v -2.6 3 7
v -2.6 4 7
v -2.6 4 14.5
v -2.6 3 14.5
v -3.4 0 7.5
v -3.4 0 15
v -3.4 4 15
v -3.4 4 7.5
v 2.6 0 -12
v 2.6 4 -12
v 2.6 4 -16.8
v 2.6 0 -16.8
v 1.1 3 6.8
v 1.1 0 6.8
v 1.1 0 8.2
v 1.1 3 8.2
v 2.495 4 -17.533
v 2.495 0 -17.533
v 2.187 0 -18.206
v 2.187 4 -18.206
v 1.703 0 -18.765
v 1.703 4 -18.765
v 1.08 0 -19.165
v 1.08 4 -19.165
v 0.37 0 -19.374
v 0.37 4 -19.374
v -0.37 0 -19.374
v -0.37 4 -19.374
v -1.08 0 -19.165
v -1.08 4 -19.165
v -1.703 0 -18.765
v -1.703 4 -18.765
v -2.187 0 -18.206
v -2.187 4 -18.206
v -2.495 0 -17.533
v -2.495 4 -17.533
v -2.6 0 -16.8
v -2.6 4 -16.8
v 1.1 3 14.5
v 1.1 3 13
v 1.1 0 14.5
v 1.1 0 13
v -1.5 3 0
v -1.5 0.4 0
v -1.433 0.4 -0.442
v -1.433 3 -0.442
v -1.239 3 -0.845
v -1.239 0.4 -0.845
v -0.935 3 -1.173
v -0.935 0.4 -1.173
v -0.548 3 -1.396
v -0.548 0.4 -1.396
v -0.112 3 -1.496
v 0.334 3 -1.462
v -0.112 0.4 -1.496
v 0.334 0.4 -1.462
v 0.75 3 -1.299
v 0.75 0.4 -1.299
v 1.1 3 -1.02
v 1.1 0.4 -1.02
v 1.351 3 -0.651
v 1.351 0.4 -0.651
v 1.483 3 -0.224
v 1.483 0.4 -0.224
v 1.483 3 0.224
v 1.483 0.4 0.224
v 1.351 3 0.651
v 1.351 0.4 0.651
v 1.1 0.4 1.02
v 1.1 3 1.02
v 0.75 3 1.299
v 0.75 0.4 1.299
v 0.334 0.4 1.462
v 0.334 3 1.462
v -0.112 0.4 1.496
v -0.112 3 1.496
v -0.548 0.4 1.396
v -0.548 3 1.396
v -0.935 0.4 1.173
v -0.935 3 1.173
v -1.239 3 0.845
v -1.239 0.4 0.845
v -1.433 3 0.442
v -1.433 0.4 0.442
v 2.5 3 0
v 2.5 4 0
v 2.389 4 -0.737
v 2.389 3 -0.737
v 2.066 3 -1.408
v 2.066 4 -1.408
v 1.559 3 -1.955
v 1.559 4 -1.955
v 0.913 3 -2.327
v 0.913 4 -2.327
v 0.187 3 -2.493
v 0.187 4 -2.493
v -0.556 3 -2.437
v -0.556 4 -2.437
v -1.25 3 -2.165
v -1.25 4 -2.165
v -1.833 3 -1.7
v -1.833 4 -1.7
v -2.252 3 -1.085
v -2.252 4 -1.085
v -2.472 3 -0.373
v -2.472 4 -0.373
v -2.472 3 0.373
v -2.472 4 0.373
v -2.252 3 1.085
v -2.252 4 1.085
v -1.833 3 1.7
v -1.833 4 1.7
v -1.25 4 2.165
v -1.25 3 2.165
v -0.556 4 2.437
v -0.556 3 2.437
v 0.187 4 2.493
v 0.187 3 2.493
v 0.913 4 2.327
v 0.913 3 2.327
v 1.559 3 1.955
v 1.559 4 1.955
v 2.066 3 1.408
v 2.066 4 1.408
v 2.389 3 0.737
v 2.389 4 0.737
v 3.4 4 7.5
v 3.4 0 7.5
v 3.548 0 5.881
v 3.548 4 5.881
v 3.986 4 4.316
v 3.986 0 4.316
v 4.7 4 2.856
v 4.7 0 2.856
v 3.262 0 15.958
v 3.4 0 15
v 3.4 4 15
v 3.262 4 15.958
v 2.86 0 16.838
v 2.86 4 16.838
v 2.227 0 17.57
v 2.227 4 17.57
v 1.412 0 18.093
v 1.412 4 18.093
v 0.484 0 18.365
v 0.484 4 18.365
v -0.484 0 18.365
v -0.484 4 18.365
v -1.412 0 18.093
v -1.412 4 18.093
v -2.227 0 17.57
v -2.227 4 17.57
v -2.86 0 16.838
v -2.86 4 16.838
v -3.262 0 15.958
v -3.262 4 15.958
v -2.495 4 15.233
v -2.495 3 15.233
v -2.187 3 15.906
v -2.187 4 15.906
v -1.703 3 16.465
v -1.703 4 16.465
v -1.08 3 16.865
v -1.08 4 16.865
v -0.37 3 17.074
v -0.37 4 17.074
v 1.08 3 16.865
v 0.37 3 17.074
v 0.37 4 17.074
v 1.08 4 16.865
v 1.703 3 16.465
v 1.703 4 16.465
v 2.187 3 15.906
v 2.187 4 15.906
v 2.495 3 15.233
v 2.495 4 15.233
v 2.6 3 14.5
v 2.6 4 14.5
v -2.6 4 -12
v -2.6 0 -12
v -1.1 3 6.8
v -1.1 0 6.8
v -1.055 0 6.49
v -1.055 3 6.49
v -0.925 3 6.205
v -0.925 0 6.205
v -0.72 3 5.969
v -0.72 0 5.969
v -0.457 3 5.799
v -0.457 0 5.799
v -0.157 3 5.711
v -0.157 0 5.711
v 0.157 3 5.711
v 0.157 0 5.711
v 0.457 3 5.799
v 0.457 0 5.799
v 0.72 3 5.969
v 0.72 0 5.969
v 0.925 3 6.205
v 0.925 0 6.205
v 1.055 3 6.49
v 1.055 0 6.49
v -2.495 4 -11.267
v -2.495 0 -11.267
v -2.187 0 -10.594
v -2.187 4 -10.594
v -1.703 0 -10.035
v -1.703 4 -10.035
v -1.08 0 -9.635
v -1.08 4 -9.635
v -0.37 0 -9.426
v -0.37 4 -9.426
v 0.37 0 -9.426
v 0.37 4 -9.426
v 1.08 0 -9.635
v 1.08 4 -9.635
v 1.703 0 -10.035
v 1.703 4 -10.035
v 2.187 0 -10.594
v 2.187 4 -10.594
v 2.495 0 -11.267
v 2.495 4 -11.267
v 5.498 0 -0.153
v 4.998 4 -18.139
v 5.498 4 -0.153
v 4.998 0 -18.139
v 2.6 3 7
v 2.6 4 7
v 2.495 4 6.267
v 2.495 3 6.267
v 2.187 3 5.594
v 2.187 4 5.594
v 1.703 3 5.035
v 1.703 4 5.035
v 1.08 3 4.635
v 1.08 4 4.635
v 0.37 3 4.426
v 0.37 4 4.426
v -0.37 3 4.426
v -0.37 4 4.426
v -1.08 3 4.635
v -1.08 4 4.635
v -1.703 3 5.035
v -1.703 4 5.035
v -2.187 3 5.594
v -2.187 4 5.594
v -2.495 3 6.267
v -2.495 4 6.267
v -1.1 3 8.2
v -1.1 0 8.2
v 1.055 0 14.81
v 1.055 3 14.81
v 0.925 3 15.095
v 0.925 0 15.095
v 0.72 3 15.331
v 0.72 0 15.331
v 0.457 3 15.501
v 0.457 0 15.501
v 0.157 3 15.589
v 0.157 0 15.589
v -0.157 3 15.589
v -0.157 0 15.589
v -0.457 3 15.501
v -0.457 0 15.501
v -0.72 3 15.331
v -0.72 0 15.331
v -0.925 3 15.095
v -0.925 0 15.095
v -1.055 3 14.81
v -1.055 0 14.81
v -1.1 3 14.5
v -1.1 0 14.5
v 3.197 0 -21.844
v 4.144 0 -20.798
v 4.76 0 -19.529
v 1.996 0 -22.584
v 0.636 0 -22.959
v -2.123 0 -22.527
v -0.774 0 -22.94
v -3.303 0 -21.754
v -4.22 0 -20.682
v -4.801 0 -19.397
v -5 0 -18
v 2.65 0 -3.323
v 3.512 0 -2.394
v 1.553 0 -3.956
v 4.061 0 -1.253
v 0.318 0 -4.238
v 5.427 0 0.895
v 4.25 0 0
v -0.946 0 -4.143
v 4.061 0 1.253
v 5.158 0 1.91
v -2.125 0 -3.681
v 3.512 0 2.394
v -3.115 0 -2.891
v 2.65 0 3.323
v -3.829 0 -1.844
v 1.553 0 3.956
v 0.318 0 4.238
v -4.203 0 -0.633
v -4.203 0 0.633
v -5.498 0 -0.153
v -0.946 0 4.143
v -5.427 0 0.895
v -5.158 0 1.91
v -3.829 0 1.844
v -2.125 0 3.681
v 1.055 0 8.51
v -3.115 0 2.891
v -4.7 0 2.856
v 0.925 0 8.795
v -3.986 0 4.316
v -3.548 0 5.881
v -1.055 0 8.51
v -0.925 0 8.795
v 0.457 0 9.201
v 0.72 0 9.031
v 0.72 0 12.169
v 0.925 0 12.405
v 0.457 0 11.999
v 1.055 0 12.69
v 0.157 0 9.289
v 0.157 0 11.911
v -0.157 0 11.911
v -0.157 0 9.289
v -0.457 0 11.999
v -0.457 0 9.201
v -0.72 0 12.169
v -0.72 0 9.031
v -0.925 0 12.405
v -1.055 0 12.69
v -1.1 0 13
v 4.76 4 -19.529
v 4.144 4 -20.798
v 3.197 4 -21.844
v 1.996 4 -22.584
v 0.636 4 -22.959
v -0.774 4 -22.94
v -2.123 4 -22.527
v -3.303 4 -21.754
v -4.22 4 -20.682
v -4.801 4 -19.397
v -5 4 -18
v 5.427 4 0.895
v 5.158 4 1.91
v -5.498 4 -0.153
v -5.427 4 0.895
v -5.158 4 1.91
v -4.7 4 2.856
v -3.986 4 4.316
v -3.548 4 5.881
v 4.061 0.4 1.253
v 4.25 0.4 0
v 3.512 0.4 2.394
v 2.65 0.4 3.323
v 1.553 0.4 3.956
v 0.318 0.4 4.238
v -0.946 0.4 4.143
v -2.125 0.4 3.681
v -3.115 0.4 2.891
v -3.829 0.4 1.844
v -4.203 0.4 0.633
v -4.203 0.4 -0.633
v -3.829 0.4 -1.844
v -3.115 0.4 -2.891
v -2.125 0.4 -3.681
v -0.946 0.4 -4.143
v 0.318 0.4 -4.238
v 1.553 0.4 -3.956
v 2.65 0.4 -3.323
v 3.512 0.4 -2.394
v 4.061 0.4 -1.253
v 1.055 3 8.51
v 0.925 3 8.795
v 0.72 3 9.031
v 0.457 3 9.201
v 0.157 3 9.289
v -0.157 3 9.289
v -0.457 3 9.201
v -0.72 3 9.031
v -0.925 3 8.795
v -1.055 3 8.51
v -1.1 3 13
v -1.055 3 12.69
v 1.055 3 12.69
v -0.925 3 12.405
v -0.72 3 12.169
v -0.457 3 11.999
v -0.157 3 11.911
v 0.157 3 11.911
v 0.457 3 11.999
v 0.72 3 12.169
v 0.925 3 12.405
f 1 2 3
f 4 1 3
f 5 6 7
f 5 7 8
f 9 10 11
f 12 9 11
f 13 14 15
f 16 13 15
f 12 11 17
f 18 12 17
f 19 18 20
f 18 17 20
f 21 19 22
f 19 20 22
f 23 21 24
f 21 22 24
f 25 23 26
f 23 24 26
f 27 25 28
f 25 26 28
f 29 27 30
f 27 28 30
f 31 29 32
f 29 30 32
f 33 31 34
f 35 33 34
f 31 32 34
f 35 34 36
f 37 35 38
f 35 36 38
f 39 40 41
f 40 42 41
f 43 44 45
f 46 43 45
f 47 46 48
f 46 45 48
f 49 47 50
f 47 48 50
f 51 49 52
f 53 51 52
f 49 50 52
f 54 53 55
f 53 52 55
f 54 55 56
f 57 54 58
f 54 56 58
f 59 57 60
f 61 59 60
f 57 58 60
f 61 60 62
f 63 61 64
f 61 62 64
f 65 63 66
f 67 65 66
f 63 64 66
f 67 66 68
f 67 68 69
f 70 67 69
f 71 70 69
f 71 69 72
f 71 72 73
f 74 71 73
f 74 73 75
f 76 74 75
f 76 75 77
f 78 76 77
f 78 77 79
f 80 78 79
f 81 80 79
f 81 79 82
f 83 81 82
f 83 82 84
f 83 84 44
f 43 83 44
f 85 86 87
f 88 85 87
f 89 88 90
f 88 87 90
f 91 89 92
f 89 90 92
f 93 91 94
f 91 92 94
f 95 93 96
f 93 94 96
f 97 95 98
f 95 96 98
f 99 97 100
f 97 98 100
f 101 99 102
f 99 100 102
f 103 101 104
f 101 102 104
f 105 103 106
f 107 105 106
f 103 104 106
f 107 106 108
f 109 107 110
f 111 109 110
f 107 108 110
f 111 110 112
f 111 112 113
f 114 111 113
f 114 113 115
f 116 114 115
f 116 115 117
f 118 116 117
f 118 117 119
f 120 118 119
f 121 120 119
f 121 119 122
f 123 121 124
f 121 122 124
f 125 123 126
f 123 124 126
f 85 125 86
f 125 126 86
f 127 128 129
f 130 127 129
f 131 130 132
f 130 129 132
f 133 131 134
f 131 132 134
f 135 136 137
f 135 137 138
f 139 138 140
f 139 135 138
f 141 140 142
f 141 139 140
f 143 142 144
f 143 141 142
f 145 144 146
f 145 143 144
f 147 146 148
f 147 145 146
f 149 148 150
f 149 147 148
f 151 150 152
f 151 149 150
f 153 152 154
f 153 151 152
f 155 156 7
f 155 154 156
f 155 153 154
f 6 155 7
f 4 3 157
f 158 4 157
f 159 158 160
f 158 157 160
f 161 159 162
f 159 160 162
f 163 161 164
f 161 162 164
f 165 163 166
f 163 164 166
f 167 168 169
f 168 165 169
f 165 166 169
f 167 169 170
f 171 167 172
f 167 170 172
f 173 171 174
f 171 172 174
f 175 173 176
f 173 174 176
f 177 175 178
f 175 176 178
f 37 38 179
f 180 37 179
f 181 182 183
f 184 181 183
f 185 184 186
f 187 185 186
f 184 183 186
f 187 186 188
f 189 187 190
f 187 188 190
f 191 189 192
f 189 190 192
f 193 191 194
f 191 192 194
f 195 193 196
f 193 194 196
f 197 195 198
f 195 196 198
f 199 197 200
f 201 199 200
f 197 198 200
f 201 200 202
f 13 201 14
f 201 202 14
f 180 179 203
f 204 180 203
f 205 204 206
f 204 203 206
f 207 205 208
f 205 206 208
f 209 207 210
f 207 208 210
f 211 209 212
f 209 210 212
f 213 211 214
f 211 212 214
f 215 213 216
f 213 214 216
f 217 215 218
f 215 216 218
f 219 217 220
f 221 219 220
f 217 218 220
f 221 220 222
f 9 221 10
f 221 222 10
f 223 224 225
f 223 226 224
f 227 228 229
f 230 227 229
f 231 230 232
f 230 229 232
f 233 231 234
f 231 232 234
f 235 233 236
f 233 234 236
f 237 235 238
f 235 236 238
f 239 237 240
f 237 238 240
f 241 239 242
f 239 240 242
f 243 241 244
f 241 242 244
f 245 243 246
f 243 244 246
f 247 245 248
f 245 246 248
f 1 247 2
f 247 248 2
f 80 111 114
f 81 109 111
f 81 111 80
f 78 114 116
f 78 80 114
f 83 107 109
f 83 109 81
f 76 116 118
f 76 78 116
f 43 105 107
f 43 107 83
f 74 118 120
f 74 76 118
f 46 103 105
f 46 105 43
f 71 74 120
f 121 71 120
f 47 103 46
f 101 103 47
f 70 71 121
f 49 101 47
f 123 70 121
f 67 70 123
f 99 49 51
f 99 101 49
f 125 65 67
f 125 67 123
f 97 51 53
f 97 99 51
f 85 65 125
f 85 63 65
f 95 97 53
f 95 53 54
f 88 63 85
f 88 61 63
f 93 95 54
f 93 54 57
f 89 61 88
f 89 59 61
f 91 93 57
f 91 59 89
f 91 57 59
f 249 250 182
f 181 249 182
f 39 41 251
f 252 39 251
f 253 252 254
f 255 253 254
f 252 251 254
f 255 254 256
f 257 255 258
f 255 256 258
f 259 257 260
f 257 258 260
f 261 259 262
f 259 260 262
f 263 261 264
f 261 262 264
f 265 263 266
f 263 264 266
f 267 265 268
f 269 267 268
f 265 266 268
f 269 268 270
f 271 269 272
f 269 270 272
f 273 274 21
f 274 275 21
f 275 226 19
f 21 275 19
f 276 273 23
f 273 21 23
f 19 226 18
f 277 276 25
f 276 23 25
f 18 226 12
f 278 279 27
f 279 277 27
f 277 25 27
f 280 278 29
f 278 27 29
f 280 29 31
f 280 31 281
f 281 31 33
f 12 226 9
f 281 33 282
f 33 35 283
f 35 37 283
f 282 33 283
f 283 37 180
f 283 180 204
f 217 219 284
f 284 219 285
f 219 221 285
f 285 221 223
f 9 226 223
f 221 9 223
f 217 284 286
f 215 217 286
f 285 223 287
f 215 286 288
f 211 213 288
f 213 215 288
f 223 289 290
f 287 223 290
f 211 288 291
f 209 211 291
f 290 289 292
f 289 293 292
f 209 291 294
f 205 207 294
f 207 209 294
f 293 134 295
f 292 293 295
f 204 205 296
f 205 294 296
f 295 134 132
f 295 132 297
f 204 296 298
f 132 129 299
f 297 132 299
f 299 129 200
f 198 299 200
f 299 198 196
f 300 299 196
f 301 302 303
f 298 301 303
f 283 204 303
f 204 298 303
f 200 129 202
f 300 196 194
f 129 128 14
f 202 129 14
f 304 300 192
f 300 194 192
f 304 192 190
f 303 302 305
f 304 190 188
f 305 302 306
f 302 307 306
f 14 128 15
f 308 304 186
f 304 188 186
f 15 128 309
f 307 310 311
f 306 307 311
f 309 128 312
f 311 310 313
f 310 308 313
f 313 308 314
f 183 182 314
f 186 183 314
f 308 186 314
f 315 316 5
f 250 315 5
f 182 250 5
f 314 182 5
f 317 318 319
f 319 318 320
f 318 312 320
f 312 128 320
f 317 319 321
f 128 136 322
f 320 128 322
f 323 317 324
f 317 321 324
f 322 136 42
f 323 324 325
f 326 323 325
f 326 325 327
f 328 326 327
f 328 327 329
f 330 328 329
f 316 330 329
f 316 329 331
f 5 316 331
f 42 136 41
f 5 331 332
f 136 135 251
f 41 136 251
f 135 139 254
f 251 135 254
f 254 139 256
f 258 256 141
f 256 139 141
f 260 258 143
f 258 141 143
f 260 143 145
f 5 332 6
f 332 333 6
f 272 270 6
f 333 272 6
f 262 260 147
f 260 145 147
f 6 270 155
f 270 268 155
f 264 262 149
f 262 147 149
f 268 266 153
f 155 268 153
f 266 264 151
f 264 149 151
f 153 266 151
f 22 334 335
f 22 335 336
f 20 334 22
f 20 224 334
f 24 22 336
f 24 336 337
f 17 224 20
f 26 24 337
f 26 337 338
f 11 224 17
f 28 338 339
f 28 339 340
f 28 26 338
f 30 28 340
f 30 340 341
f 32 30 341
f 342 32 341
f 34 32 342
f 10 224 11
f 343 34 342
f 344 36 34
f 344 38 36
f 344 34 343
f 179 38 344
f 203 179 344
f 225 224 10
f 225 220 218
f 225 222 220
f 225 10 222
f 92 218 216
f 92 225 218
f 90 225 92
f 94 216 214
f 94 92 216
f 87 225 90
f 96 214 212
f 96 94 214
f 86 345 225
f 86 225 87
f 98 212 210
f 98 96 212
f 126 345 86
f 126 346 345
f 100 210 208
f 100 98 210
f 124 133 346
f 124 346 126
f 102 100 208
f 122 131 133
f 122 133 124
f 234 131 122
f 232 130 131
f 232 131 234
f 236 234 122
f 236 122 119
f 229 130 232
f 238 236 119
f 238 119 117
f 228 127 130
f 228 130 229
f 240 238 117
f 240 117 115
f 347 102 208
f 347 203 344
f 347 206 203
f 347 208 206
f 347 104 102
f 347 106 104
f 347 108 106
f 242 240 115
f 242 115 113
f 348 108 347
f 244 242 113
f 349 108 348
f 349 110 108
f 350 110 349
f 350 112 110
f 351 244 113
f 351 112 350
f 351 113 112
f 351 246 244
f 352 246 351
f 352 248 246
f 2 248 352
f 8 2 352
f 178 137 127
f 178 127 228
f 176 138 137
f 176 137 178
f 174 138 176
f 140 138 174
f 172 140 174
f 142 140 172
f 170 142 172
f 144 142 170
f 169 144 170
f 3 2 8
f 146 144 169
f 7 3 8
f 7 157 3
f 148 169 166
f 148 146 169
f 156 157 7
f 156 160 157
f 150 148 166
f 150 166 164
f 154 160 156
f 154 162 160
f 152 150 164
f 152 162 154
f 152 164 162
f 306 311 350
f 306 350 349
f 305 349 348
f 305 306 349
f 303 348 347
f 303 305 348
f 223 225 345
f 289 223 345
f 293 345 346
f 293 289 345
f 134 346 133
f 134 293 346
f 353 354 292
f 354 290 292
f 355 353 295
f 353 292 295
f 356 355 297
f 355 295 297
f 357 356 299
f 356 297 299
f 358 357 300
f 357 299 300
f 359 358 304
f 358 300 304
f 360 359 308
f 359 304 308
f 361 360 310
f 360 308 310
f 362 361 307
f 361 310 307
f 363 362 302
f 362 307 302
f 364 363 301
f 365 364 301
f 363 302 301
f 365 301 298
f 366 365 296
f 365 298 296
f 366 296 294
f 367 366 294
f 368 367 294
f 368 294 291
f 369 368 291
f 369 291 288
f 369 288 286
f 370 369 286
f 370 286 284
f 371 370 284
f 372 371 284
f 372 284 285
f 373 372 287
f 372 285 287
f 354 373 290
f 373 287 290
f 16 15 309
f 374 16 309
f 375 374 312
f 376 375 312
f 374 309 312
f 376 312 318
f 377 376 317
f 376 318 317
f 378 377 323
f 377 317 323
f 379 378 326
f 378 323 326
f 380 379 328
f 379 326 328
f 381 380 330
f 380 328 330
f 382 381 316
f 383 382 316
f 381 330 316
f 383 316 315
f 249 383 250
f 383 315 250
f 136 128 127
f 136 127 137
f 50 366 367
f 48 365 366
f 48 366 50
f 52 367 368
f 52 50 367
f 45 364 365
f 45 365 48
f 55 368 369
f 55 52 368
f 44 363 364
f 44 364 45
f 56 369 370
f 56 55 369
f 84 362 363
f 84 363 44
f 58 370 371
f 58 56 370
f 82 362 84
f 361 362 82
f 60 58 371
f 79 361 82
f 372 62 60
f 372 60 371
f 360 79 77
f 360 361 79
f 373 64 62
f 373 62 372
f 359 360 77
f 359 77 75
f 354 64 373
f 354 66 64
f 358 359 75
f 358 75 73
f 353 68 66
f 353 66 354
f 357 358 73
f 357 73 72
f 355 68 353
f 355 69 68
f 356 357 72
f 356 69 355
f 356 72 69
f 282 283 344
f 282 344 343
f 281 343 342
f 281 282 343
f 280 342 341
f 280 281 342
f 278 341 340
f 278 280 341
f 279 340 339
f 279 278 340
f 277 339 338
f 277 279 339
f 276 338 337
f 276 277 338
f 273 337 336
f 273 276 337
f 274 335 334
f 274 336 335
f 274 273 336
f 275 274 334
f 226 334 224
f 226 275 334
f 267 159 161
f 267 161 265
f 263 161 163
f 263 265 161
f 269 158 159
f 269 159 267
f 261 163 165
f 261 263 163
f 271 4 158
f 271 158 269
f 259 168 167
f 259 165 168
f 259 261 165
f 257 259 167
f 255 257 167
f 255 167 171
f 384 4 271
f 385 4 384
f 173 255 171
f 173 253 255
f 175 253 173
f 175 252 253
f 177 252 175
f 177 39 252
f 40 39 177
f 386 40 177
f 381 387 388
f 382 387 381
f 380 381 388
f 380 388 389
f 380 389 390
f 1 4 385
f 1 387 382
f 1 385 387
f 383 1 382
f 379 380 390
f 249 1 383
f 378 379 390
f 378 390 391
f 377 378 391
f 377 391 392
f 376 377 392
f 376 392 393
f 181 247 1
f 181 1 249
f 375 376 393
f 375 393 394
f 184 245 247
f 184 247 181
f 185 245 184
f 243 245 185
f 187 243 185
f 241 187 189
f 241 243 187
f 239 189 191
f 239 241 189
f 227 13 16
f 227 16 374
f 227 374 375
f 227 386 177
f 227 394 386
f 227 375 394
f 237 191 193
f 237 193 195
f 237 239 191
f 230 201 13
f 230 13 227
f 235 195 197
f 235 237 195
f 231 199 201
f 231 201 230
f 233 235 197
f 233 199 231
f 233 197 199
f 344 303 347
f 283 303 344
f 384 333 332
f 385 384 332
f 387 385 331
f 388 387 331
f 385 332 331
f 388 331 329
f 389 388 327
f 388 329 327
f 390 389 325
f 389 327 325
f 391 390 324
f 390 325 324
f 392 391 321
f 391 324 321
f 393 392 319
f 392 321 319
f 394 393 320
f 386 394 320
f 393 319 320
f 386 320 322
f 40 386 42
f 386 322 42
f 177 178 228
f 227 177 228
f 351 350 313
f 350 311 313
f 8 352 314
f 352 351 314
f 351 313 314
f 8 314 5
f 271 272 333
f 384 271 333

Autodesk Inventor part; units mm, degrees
ref_plane "YZ Plane" through (0, 0, 0) normal (1, 0, 0) x (0, 1, 0)
ref_plane "XZ Plane" through (0, 0, 0) normal (0, 1, 0) x (-1, 0, 0)
ref_plane "XY Plane" through (0, 0, 0) normal (0, 0, 1) x (1, 0, 0)
sketch "Sketch1" plane through (0, 0, 0) normal (0, 1, 0) x (-1, 0, 0)
  circle A0 centre (0, 0) radius 1.5
  circle A1 centre (0, 0) radius 5.5
  circle A2 centre (0, -18) radius 5
  line L0 (5.4979, -0.1528) -> (4.9981, -18.1389)
  line L1 (-4.9981, -18.1389) -> (-5.4979, -0.1528)
  line L2 (0, 0) -> (0, 15) construction
  line L3 (-3.4, 0) -> (-3.4, 15)
  line L4 (3.4, 15) -> (3.4, 0)
  arc A3 (-3.4, 0) -> (3.4, 0) centre (0, 0) ccw
  arc A4 (3.4, 15) -> (-3.4, 15) centre (0, 15) ccw
  arc A5 (3.4, 7.5) -> (4.7003, 2.8561) centre (12.3429, 7.5) ccw
  arc A6 (-4.7003, 2.8561) -> (-3.4, 7.5) centre (-12.3429, 7.5) ccw
  point P0 (0, 7.5)
  point P1 (-3.4, 4.3232)
  point P2 (3.4, 4.3232)
  point P3 (-3.4, 7.5)
  dimension "d0" = 3
  dimension "d1" = 11
  dimension "d3" = 18
  dimension "d43" = 15
  dimension "d44" = 3.4
  dimension "d74" = 10
extrude "Extrusion1" add sketch "Sketch1" along normal blind 4
sketch "Sketch2" plane through (0, 4, 0) normal (0, 1, 0) x (1, 0, 0)
  arc A0 (4.9981, 18.1389) -> (-4.9981, 18.1389) centre (0, 18) ccw projected
  circle A1 centre (0, 0) radius 1.5 projected
  line L0 (0, 16.8) -> (0, 12) construction
  line L1 (-2.6, 16.8) -> (-2.6, 12)
  line L2 (2.6, 12) -> (2.6, 16.8)
  arc A2 (2.6, 16.8) -> (-2.6, 16.8) centre (0, 16.8) ccw
  arc A3 (-2.6, 12) -> (2.6, 12) centre (0, 12) ccw
  line L3 (-3.4, -7.5) -> (-3.4, -15) projected
  arc A4 (-3.4, -15) -> (3.4, -15) centre (0, -15) ccw projected
  line L4 (3.4, -15) -> (3.4, -7.5) projected
  line L5 (-4.9981, 18.1389) -> (-5.4979, 0.1528) projected
  arc A5 (-5.4979, 0.1528) -> (-4.7003, -2.8561) centre (0, 0) ccw projected
  arc A6 (4.7003, -2.8561) -> (5.4979, 0.1528) centre (0, 0) ccw projected
  line L6 (5.4979, 0.1528) -> (4.9981, 18.1389) projected
  arc A7 (-3.4, -7.5) -> (-4.7003, -2.8561) centre (-12.3429, -7.5) ccw projected
  arc A8 (4.7003, -2.8561) -> (3.4, -7.5) centre (12.3429, -7.5) ccw projected
  point P0 (0, 14.4)
  dimension "d6" = 4.8
  dimension "d7" = 5.2
  dimension "d9" = 12
extrude "Extrusion2" cut sketch "Sketch2" against normal through all contours A2 L2 A3 L1
sketch "Sketch8" plane through (0, 4, 0) normal (0, 1, 0) x (1, 0, 0)
  line L0 (0, 31.28) -> (0, -26.68) projected
  line L1 (0, -14.5) -> (0, -7) construction
  line L2 (2.6, -14.5) -> (2.6, -7)
  line L3 (-2.6, -7) -> (-2.6, -14.5)
  arc A0 (-2.6, -14.5) -> (2.6, -14.5) centre (0, -14.5) ccw
  arc A1 (2.6, -7) -> (-2.6, -7) centre (0, -7) ccw
  point P0 (0, 0)
  point P1 (0, -10.75)
  dimension "d45" = 5.2
  dimension "d47" = 7
  dimension "d48" = 14.5
extrude "Extrusion8" cut sketch "Sketch8" against normal blind 1
sketch "Sketch10" plane through (0, 0, 0) normal (0, -1, 0) x (1, 0, 0)
  line L0 (0, 6.8) -> (0, 8.2) construction
  line L1 (1.1, 6.8) -> (1.1, 8.2)
  line L2 (-1.1, 8.2) -> (-1.1, 6.8)
  arc A0 (-1.1, 6.8) -> (1.1, 6.8) centre (0, 6.8) ccw
  arc A1 (1.1, 8.2) -> (-1.1, 8.2) centre (0, 8.2) ccw
  line L3 (0, 13) -> (0, 14.5) construction
  line L4 (1.1, 13) -> (1.1, 14.5)
  line L5 (-1.1, 14.5) -> (-1.1, 13)
  arc A2 (-1.1, 13) -> (1.1, 13) centre (0, 13) ccw
  arc A3 (1.1, 14.5) -> (-1.1, 14.5) centre (0, 14.5) ccw
  line L6 (0, -7.3) -> (0, -7.7) construction
  line L7 (1.1, -7.3) -> (1.1, -7.7)
  line L8 (-1.1, -7.7) -> (-1.1, -7.3)
  arc A4 (1.1, -7.3) -> (-1.1, -7.3) centre (0, -7.3) ccw
  arc A5 (-1.1, -7.7) -> (1.1, -7.7) centre (0, -7.7) ccw
  point P0 (0, 0)
  point P1 (0, 7.5)
  point P2 (0, 13.75)
  point P3 (0, -7.5)
  dimension "d60" = 2.2
  dimension "d61" = 6.8
  dimension "d62" = 1.4
  dimension "d63" = 1.5
  dimension "d64" = 2.2
  dimension "d65" = 13
  dimension "d78" = 0.2
  dimension "d79" = 7.5
extrude "Extrusion9" cut sketch "Sketch10" against normal through all contours A0 L2 A1 L1 | A2 L5 A3 L4
sketch "Sketch11" plane through (0, 0, 0) normal (0, -1, 0) x (1, 0, 0)
  circle A0 centre (0, 0) radius 4.25
  dimension "d73" = 8.5
extrude "Extrusion10" cut sketch "Sketch11" against normal blind 0.4
sketch "Sketch12" plane through (0, 4, 0) normal (0, 1, 0) x (1, 0, 0)
  circle A0 centre (0, 0) radius 2.5
  dimension "d75" = 5
extrude "Extrusion11" cut sketch "Sketch12" against normal blind 1
properties part number "Servo steering actuator v2"
